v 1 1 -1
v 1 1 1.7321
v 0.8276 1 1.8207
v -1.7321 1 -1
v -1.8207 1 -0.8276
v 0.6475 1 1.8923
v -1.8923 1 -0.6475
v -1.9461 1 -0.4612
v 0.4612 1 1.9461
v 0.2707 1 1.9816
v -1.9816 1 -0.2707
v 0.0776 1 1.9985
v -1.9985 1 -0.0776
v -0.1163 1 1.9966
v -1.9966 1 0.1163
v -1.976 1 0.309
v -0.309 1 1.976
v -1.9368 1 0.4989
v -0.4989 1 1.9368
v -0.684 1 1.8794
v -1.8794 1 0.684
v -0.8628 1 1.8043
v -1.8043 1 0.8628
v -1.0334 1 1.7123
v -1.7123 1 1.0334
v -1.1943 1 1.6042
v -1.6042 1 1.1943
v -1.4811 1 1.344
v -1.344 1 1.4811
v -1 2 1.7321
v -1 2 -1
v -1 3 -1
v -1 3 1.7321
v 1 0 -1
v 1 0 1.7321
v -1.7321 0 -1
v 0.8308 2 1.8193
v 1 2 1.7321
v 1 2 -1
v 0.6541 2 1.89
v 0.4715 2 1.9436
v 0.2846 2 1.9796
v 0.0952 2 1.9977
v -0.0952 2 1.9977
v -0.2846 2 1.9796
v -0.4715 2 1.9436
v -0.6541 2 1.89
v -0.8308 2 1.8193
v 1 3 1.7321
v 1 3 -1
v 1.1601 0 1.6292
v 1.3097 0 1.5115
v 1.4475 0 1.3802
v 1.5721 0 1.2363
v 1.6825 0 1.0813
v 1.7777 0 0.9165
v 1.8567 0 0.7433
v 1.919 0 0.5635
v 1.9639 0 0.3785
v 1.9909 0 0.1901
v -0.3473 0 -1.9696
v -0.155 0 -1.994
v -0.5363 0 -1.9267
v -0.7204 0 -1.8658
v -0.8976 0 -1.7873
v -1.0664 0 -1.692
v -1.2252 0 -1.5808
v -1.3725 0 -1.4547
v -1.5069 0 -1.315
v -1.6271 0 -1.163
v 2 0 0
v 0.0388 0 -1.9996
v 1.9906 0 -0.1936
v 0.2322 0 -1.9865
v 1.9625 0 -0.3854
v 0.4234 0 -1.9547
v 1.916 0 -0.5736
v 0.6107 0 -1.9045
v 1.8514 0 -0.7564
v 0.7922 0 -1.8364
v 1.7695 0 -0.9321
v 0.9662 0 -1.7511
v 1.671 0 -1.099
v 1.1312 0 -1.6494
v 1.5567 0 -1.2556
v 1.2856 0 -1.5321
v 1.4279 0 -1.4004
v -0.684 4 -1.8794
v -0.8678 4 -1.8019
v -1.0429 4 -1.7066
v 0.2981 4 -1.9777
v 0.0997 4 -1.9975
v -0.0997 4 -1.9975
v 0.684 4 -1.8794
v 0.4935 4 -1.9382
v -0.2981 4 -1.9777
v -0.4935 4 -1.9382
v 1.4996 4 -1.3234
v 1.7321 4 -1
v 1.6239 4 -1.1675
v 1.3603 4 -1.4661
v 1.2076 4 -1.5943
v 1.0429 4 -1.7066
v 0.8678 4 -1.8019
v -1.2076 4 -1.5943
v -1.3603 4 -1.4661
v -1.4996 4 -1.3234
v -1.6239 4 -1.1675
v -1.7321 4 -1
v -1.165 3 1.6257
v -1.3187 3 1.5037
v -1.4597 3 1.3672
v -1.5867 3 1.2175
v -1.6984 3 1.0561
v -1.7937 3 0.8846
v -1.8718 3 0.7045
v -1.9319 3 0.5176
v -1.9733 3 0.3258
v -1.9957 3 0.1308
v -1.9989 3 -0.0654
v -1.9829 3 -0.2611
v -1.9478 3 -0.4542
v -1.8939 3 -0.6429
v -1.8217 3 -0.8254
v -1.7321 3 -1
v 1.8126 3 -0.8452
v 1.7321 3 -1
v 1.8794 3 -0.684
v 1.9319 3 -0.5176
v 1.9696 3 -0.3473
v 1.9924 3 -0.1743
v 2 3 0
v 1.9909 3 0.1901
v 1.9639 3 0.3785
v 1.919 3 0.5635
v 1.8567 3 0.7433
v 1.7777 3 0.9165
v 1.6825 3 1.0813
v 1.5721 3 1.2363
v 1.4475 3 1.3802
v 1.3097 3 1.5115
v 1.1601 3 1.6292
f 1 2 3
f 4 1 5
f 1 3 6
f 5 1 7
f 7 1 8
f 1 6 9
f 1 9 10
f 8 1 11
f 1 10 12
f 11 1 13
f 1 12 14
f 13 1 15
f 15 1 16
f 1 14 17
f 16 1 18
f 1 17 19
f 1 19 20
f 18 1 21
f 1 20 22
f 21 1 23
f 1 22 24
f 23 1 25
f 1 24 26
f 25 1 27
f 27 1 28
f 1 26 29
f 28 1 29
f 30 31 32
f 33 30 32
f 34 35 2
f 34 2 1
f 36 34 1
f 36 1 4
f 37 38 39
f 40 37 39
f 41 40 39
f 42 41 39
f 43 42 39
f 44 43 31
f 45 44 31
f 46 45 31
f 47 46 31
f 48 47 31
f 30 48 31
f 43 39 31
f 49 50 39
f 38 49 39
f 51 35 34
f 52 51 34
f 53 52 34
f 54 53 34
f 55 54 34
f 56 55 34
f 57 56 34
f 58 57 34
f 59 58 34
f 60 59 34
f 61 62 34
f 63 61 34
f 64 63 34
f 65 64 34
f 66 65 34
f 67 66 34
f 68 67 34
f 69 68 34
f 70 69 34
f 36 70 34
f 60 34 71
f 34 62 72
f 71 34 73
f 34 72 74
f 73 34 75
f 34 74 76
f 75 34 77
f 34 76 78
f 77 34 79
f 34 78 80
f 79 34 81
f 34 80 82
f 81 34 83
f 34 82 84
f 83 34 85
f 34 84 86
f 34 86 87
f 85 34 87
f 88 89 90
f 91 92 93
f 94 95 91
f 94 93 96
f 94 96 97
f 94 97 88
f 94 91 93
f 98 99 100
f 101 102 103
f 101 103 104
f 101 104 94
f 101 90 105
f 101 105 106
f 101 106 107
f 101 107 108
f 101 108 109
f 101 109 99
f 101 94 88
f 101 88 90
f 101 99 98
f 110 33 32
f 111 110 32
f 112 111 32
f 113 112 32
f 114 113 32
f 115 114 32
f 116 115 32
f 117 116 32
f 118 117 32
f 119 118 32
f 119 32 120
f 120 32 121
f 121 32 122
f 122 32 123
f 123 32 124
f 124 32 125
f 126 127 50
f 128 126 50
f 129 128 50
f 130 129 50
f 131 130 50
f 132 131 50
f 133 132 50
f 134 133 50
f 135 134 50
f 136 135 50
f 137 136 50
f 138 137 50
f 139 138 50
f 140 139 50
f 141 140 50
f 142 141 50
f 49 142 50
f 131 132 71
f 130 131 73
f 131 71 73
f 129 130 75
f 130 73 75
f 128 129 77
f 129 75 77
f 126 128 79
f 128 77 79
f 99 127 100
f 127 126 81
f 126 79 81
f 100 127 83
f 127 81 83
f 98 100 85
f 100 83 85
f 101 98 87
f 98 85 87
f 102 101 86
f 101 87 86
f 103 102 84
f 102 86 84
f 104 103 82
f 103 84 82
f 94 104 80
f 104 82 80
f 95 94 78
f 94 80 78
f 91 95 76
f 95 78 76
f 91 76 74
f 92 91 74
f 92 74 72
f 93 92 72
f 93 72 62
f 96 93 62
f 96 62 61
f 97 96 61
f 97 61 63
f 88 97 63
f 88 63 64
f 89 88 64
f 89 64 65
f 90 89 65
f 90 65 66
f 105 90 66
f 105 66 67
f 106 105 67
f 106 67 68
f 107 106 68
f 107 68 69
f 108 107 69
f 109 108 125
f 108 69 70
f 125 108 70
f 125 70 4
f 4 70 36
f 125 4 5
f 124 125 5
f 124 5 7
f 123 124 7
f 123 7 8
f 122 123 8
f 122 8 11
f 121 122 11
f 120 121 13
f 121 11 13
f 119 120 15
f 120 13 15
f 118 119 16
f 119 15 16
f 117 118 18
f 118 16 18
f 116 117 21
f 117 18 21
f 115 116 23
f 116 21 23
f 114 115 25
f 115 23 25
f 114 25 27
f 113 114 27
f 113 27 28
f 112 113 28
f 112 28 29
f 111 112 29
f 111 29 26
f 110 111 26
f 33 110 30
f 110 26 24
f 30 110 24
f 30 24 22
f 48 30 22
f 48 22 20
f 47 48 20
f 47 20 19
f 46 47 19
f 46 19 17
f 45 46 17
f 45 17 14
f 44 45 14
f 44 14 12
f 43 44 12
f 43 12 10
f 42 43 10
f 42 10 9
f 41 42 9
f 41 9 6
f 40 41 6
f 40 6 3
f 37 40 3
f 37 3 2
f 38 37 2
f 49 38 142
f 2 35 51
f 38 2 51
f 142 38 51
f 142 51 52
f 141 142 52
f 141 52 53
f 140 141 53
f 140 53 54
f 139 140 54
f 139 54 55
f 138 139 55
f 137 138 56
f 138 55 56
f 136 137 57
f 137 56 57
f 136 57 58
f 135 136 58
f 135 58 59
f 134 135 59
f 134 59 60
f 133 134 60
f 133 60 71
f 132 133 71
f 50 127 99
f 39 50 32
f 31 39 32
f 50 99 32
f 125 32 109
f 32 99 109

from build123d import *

# Parameters (mm, degrees)
SKETCH1_R               = 2
BOSS_EXTRUDE1_DEPTH     = 4
CUT_EXTRUDE1_DEPTH      = 3
CUT_EXTRUDE1_DEPTH_BACK = 1
CUT_EXTRUDE9_DEPTH      = 1


with BuildPart() as part:
    # Sketch1 → Boss-Extrude1 (new body)
    with BuildSketch(Plane(origin=(0, 0, 0), x_dir=(1, 0, 0), z_dir=(0, 1, 0))):
        Circle(SKETCH1_R)
    extrude(amount=BOSS_EXTRUDE1_DEPTH)

    # Sketch2 → Cut-Extrude1 (cut, two sides)
    with BuildSketch(Plane.XY) as cut_extrude1_sk:
        Polygon((-2, 4), (2, 4), (2, 3), (1, 3), (1, 2), (-1, 2), (-1, 3), (-2, 3), align=None)
    extrude(amount=CUT_EXTRUDE1_DEPTH, mode=Mode.SUBTRACT)
    extrude(cut_extrude1_sk.sketch, amount=-CUT_EXTRUDE1_DEPTH_BACK, mode=Mode.SUBTRACT)

    # Sketch4 → Cut-Extrude9 (cut)
    with BuildSketch(Plane.XZ):
        with BuildLine():
            Line((-1, -1), (-1.732050808, -1))
            ThreePointArc((-1.732050808, -1), (-1.414213562, 1.414213562), (1, 1.732050808))
            Line((1, 1.732050808), (1, -1))
            Line((1, -1), (-1, -1))
        make_face()
    extrude(amount=-CUT_EXTRUDE9_DEPTH, mode=Mode.SUBTRACT)


solid = part.part
